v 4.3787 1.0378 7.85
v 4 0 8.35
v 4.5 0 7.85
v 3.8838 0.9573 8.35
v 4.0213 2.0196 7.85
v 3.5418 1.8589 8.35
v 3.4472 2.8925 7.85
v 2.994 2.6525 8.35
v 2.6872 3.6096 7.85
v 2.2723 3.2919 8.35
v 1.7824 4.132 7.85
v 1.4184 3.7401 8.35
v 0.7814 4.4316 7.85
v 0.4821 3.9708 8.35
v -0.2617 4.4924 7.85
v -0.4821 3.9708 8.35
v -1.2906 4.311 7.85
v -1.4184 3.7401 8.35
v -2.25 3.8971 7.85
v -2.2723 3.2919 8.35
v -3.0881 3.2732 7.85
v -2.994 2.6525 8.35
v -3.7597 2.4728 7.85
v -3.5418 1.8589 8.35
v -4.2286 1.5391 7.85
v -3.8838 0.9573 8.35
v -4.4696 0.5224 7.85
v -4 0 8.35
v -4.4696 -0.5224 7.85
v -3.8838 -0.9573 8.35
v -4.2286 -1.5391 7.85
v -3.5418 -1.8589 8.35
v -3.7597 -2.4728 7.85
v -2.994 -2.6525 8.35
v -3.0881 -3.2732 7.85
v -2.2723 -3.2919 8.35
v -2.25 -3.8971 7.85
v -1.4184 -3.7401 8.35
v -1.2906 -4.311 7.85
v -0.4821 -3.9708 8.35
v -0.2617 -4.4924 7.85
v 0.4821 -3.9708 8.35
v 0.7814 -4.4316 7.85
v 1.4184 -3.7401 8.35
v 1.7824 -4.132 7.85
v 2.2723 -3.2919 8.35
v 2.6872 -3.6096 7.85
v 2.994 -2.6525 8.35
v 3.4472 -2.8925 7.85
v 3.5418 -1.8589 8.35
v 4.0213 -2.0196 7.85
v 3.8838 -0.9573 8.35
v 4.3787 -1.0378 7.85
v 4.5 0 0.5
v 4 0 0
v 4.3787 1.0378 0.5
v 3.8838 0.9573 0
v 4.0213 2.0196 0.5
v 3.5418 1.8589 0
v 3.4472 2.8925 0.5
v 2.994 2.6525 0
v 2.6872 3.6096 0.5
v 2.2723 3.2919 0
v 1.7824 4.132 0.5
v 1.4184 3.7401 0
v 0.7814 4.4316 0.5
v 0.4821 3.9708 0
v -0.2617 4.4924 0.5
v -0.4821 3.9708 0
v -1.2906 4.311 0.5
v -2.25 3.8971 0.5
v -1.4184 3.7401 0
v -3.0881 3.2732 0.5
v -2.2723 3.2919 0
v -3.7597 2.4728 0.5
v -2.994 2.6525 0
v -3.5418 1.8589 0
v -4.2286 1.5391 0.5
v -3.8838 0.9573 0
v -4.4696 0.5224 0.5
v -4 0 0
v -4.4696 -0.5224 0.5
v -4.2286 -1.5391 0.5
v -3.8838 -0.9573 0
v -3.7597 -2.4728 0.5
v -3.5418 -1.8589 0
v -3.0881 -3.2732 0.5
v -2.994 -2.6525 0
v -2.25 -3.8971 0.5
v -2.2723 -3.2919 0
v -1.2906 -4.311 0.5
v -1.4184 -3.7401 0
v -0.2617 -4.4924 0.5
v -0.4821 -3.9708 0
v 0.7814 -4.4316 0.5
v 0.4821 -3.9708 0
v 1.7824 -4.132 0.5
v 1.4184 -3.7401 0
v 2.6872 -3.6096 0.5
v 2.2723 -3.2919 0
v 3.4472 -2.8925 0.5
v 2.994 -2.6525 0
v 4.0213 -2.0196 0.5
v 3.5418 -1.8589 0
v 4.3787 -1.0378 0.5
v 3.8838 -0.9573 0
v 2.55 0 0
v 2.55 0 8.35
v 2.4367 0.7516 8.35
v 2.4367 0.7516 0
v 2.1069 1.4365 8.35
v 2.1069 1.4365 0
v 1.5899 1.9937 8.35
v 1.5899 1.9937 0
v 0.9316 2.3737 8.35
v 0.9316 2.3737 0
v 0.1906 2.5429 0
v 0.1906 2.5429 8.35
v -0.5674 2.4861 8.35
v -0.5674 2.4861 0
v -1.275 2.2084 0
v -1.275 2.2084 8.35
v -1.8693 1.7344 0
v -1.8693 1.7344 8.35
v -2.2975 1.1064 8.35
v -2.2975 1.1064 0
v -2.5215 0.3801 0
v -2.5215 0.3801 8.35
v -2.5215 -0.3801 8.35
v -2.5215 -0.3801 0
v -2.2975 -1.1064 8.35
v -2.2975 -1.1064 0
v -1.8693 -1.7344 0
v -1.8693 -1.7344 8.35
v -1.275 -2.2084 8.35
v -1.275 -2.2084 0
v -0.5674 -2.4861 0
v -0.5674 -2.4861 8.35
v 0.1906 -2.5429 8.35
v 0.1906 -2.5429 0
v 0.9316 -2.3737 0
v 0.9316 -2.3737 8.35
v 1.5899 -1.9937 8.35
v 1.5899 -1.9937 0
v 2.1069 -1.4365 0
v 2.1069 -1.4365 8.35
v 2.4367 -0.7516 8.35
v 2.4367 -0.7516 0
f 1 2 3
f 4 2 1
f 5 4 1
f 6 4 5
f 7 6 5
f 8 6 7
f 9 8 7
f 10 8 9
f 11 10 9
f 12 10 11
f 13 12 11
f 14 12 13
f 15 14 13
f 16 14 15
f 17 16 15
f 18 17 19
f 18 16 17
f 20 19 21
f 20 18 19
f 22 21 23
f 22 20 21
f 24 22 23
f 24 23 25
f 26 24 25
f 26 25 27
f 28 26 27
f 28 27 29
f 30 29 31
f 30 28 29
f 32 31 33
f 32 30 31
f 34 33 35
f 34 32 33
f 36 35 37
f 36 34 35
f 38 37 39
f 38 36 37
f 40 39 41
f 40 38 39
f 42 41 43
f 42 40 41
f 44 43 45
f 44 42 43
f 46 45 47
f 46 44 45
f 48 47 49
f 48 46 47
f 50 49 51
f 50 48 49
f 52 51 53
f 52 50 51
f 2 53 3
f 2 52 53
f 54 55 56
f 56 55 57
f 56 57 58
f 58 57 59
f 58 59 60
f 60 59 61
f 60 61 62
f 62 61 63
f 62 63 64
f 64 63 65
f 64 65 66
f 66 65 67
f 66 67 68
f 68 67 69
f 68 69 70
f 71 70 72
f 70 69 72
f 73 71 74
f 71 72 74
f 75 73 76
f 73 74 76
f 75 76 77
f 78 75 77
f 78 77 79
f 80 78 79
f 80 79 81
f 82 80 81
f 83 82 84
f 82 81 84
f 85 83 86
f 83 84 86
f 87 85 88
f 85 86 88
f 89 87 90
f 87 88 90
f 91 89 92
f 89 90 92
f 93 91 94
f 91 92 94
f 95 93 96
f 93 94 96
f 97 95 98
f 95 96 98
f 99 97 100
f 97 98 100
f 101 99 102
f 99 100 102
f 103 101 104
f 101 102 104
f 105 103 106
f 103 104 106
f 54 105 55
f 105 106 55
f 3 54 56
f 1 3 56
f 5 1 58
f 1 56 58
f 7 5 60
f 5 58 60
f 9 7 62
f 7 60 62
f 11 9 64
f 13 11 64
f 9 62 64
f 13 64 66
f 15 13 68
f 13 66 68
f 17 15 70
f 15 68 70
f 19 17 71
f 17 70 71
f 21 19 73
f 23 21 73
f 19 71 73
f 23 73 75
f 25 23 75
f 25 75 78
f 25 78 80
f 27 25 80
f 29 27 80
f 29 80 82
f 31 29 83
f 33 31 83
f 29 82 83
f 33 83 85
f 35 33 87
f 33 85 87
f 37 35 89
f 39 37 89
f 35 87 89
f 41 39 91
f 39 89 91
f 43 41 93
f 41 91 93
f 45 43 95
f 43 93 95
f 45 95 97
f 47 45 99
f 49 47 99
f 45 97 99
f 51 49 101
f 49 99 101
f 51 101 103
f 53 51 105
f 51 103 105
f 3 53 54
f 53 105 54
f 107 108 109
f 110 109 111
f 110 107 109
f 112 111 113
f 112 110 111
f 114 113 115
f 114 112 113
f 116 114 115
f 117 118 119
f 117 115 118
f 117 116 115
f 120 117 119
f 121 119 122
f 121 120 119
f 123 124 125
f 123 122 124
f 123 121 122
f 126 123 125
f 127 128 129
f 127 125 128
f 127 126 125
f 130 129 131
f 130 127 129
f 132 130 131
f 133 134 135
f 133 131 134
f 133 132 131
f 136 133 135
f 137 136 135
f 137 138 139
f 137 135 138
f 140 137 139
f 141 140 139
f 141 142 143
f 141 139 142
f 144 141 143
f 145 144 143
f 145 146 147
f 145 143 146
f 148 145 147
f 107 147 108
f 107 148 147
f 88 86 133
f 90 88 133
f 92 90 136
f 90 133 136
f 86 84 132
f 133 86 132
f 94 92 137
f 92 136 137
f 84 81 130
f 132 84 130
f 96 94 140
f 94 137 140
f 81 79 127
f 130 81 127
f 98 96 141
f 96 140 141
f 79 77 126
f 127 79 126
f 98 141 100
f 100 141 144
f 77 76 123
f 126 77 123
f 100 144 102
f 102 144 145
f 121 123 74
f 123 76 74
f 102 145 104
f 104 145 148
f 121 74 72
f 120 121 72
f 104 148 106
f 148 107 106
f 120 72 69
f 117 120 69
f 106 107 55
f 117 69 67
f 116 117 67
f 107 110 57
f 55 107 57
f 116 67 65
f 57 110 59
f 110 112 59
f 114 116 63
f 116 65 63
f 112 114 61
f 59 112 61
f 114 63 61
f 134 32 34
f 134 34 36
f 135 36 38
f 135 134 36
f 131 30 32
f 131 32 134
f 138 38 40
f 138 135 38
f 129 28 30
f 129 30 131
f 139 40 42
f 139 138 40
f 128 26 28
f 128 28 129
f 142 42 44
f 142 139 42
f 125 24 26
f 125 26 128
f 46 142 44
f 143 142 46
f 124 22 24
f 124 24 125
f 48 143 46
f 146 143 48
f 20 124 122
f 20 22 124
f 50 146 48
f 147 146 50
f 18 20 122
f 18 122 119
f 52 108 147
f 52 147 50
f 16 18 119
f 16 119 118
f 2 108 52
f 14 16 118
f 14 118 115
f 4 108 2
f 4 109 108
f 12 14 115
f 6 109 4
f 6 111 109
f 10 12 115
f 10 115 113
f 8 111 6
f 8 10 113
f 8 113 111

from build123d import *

# Parameters (mm, degrees)
SKETCH1_R           = 4.5
BOSS_EXTRUDE1_DEPTH = 8.35
SKETCH2_R           = 2.55
CUT_EXTRUDE1_DEPTH  = 11.498690395
CHAMFER1_SIZE       = 0.5


with BuildPart() as part:
    # Sketch1 → Boss-Extrude1 (new body)
    with BuildSketch(Plane.XY):
        Circle(SKETCH1_R)
    extrude(amount=BOSS_EXTRUDE1_DEPTH)

    # Sketch2 → Cut-Extrude1 (cut, through all)
    with BuildSketch(Plane.XY):
        Circle(SKETCH2_R)
    extrude(amount=CUT_EXTRUDE1_DEPTH, mode=Mode.SUBTRACT)

    # Chamfer1
    chamfer1_edges = [part.edges().sort_by_distance(p)[0] for p in [
        (-4.5, 0, 0),
        (-4.5, 0, 8.35),
    ]]
    chamfer(chamfer1_edges, length=CHAMFER1_SIZE)


solid = part.part
